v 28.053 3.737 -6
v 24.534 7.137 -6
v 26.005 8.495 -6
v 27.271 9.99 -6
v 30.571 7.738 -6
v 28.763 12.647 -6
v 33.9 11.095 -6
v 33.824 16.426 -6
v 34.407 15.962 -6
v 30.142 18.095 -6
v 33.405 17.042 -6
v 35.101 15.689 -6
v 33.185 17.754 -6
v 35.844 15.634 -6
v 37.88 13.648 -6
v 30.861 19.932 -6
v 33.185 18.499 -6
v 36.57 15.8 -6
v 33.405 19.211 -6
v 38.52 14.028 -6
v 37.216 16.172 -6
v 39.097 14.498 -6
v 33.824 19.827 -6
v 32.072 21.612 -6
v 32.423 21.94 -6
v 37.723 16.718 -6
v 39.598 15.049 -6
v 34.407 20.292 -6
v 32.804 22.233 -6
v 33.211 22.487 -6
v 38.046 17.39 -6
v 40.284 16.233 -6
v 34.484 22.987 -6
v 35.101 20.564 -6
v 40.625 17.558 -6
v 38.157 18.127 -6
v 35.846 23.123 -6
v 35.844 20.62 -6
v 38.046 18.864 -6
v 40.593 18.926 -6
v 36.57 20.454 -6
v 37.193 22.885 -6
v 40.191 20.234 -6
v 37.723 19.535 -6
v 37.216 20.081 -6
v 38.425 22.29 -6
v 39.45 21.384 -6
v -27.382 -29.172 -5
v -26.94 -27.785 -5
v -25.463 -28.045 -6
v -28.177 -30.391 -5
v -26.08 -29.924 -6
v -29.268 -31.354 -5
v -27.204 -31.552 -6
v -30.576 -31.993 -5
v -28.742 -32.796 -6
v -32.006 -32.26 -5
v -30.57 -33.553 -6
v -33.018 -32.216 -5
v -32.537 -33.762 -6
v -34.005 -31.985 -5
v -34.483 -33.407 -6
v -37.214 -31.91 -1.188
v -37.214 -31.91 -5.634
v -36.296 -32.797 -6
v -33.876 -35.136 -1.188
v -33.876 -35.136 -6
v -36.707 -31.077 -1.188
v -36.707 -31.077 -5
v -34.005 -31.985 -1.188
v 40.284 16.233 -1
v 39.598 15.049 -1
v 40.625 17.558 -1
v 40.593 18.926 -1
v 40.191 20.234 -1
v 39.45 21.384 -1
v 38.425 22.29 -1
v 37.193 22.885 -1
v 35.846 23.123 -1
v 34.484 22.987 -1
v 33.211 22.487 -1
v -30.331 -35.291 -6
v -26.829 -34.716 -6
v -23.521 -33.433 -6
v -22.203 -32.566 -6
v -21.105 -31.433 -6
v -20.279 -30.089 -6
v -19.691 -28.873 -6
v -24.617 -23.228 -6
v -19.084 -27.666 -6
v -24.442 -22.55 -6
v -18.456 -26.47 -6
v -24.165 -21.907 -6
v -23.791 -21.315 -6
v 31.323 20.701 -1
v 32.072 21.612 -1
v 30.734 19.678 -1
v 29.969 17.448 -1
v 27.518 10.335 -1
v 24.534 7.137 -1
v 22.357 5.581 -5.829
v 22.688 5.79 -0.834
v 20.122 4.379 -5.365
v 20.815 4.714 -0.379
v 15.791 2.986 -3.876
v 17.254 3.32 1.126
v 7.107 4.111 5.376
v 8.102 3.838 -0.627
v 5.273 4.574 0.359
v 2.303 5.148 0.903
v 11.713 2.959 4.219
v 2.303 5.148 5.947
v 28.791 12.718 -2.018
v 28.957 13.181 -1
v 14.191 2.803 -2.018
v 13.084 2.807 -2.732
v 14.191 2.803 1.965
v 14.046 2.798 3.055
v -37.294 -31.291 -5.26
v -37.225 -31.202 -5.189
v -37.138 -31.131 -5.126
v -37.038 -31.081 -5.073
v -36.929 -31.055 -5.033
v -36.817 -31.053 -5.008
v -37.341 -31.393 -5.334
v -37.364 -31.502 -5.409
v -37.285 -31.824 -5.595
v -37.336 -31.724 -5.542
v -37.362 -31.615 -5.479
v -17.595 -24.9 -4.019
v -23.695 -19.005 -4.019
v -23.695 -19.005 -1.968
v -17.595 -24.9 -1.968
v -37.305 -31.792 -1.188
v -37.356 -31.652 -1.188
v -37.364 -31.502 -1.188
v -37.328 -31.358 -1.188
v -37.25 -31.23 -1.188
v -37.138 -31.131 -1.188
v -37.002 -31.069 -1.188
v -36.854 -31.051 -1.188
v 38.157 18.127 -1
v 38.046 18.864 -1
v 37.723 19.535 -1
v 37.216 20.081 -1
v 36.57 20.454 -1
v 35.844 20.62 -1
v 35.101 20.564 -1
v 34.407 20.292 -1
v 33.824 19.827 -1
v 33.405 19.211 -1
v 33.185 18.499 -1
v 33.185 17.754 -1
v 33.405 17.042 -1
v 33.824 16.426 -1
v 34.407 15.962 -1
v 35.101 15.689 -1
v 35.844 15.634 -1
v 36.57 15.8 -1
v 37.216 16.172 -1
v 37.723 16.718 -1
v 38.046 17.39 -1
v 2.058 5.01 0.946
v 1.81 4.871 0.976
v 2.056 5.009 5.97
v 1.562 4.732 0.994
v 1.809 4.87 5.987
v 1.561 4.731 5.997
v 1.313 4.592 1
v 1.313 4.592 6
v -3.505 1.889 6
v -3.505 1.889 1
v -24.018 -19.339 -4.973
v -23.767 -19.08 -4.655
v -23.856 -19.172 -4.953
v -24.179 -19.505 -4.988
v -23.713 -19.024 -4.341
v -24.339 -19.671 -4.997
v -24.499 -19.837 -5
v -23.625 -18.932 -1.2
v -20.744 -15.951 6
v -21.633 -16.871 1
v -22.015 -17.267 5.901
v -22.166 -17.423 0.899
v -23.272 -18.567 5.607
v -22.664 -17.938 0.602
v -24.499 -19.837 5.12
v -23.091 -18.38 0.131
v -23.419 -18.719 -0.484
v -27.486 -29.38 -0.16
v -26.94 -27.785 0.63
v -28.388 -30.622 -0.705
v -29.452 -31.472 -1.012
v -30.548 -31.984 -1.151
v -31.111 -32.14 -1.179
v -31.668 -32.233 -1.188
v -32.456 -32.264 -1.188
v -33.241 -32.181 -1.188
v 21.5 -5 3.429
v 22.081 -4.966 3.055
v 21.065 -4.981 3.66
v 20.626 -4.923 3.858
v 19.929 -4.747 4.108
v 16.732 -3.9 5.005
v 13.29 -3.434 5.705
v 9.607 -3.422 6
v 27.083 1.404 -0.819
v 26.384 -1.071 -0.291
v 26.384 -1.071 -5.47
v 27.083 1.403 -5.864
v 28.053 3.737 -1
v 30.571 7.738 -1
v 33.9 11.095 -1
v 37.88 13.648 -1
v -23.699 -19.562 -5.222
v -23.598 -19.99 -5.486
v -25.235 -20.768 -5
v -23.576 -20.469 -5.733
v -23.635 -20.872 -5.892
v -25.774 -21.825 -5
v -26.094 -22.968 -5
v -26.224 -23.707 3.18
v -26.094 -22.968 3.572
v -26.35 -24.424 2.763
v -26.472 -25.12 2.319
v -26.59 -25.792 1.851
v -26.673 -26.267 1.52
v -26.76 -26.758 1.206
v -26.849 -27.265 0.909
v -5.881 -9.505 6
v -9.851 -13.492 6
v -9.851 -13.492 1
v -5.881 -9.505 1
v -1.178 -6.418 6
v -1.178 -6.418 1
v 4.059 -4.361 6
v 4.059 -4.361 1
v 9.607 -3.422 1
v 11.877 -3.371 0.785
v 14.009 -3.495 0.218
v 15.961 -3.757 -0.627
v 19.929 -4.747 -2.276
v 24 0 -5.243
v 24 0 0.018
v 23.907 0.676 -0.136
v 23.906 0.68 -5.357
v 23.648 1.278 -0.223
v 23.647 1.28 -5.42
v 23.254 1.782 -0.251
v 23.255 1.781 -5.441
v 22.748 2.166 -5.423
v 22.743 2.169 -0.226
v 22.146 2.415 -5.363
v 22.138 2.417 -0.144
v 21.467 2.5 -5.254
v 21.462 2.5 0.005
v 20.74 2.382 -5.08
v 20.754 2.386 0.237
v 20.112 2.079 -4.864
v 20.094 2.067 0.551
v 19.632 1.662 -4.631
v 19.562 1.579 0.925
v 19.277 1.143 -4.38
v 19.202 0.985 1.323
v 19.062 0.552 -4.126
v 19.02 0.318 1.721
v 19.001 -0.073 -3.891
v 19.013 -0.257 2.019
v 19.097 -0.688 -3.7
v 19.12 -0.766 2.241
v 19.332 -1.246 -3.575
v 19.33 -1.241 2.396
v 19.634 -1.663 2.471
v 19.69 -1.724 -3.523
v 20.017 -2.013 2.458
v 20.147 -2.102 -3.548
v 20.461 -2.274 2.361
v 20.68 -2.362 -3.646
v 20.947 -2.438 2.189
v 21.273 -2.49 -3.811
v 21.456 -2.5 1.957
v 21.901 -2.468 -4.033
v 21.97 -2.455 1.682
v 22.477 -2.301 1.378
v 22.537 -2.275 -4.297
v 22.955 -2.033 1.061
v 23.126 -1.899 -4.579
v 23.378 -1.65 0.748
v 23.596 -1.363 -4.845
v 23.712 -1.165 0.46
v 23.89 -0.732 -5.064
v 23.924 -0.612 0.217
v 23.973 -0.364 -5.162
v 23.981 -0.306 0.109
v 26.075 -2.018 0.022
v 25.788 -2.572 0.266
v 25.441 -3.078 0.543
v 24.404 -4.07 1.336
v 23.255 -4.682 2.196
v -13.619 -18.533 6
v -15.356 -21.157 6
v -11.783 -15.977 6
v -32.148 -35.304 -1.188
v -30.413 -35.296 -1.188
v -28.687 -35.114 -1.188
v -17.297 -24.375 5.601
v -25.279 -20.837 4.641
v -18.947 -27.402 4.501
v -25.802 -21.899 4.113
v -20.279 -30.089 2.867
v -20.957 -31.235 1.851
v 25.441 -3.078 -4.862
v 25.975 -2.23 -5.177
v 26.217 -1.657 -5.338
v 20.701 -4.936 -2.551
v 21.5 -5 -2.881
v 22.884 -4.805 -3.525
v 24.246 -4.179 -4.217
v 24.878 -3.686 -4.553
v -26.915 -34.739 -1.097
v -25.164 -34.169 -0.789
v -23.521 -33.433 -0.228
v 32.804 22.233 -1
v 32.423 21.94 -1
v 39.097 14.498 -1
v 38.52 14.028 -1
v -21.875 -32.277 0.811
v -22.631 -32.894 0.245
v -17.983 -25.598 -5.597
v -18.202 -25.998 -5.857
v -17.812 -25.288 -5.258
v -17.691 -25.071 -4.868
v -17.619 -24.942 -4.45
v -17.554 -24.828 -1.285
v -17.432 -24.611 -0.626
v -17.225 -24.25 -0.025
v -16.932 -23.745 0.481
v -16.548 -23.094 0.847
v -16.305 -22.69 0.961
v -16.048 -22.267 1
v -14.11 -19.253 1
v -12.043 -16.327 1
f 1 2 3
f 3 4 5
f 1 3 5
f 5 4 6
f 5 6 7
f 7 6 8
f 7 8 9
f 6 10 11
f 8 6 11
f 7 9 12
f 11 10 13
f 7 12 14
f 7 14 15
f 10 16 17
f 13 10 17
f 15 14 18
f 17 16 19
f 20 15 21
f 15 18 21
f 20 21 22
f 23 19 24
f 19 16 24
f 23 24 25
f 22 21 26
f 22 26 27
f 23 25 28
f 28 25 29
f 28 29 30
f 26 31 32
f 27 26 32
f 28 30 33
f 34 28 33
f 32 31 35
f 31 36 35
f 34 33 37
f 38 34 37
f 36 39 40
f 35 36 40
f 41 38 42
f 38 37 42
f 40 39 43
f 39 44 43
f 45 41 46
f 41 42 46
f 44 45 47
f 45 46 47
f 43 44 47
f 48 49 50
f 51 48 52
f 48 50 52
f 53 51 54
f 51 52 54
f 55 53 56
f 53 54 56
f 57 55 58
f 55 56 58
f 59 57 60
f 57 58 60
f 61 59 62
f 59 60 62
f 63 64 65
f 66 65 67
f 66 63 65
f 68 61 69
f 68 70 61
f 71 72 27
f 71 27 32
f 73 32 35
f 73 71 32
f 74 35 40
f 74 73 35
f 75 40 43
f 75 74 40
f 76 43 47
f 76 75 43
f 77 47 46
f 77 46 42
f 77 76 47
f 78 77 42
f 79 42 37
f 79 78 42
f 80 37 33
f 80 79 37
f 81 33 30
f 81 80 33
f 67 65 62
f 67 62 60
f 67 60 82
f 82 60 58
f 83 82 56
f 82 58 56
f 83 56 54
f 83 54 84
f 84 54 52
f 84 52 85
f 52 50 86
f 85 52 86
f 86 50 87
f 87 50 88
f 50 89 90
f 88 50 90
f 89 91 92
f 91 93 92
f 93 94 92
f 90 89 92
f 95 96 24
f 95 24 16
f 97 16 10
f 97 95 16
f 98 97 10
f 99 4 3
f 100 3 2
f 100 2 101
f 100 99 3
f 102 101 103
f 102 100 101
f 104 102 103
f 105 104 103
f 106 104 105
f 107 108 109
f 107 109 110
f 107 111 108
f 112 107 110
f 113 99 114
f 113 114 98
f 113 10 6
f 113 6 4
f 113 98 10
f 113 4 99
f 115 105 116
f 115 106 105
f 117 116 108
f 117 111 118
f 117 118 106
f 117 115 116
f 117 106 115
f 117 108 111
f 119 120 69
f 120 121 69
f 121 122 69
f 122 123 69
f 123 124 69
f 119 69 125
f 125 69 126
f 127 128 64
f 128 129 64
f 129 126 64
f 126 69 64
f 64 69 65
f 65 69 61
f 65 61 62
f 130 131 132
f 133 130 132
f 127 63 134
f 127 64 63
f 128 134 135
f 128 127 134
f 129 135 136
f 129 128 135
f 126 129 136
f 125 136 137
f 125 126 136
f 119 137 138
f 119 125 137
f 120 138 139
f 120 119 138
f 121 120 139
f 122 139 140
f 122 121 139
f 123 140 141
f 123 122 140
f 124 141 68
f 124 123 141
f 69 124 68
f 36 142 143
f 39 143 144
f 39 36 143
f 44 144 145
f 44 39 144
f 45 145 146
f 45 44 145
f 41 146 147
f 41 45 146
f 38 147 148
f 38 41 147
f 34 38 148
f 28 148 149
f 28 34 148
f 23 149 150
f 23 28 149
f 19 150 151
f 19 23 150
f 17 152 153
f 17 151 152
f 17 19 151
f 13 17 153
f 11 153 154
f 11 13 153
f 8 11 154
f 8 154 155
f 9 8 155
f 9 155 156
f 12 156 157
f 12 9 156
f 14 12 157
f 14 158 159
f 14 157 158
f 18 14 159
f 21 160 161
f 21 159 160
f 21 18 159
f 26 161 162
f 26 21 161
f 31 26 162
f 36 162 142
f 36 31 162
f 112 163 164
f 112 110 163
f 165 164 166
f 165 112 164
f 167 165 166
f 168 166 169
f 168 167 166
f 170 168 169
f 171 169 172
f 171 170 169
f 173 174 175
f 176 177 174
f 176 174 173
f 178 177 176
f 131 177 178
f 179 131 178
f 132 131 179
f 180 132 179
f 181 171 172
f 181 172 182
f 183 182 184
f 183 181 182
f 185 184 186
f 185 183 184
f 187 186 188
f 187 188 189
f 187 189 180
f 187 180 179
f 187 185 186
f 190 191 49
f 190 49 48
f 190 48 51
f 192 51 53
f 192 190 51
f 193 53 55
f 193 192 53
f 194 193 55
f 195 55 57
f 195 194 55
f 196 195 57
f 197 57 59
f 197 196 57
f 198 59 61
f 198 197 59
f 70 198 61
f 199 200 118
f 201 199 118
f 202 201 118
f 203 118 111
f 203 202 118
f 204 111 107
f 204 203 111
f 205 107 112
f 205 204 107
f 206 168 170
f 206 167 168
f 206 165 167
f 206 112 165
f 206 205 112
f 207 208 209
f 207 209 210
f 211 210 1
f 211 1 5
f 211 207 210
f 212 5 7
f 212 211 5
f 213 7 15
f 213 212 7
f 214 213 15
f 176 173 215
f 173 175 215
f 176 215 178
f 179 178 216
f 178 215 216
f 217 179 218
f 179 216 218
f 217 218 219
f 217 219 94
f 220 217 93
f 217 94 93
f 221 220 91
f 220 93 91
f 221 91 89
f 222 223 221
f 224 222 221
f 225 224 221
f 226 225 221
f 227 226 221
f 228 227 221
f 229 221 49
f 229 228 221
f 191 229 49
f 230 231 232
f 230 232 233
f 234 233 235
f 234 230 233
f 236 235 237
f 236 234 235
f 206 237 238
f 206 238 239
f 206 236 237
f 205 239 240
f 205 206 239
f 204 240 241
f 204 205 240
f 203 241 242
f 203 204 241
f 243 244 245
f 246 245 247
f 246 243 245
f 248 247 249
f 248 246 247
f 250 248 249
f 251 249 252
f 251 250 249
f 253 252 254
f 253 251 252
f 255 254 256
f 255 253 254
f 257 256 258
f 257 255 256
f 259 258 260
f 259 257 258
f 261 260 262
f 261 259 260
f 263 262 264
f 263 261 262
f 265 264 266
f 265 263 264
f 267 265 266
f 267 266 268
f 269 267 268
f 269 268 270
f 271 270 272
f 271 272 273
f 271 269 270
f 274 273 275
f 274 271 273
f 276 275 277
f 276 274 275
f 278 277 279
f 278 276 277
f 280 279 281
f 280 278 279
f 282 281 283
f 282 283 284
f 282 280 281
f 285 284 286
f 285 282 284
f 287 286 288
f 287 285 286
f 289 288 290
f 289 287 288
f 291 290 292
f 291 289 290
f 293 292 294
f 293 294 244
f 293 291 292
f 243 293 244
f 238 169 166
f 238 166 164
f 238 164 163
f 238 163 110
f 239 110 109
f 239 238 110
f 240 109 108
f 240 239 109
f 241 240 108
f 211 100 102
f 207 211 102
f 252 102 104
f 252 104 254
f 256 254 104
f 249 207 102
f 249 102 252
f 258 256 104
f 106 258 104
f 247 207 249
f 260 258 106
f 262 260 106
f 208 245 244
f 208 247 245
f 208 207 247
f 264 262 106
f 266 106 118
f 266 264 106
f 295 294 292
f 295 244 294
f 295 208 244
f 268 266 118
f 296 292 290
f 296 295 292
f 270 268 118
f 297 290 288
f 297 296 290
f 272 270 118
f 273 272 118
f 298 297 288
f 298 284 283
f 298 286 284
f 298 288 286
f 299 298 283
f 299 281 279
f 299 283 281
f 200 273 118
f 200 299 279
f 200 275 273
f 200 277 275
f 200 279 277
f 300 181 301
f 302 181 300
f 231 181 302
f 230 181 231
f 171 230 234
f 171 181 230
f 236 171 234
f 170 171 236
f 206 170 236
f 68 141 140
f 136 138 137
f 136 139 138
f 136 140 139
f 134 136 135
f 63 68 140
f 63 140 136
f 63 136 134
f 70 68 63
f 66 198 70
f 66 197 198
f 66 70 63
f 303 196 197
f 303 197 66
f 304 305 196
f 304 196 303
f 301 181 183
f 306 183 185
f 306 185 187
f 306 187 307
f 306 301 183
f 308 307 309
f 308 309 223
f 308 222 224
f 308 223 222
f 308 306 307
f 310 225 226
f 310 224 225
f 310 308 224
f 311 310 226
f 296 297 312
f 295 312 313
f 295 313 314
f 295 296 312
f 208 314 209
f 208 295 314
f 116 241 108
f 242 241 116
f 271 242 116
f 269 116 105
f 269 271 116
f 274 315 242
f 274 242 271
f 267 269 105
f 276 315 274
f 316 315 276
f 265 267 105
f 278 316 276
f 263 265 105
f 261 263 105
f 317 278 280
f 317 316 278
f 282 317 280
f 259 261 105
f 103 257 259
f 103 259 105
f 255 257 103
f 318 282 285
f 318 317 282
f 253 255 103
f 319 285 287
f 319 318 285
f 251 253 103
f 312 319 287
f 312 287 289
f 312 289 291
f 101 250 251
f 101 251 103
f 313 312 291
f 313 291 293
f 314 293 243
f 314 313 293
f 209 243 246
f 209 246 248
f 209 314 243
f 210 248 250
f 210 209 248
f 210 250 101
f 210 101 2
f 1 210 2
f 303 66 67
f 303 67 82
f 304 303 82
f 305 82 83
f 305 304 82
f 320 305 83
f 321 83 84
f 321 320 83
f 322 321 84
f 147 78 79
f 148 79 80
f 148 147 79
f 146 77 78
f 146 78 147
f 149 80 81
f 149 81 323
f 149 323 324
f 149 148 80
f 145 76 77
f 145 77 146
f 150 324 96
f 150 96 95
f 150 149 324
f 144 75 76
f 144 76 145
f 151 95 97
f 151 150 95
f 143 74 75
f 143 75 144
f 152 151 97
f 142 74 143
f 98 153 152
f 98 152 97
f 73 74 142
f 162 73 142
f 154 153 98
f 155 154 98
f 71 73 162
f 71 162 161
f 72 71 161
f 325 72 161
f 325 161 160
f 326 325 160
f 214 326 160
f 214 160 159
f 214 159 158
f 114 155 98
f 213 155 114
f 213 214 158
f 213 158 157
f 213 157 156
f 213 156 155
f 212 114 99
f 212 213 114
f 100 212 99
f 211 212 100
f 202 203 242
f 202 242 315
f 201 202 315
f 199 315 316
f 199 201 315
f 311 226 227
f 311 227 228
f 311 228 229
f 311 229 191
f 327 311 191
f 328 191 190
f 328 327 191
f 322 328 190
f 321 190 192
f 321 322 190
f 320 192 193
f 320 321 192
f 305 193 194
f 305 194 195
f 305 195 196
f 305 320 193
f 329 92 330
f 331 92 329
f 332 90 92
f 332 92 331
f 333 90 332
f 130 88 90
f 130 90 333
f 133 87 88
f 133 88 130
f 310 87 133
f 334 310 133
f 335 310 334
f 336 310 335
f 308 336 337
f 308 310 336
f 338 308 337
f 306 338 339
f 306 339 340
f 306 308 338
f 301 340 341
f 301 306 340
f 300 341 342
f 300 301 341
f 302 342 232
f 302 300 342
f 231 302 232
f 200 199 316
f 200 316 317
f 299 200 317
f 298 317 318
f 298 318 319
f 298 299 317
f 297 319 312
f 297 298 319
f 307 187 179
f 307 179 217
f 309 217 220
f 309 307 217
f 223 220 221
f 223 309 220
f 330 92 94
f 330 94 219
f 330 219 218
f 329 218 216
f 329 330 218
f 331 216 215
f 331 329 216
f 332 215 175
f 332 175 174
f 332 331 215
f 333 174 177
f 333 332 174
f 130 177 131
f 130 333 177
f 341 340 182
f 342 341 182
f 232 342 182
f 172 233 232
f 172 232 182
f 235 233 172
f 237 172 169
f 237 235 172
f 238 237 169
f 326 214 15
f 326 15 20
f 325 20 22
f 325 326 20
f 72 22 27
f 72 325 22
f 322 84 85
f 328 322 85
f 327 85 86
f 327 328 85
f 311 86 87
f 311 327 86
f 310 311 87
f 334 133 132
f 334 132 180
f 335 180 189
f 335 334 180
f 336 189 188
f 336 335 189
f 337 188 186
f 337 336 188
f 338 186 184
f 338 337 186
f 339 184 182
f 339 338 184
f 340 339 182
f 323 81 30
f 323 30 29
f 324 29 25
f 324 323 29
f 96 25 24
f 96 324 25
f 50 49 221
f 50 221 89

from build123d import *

# Parameters (mm, degrees)
SKETCH_1_R               = 2.5
EXTRUDE_1_DEPTH          = 6
SKETCH_2_OUTSIDE_W       = 116.224
SKETCH_2_OUTSIDE_H       = 89.061
CUT_EXTRUDE_1_DEPTH      = 12
CUT_EXTRUDE_2_DEPTH      = 10
CUT_EXTRUDE_2_DEPTH_BACK = 58.99683528
SKETCH_3_OUTSIDE_W       = 33.874
SKETCH_3_OUTSIDE_H       = 119.124
FILLET_1_R               = 0.5


with BuildPart() as part:
    # 草圖1 → 填料-伸長1 (new, symmetric)
    with BuildSketch(Plane.XY):
        with BuildLine():
            Line((33.210571119, 22.487406669), (9.212656684, 9.024071248))
            Line((9.212656684, 9.024071248), (9.212656684, 13.217540535))
            Line((9.212656684, 13.217540535), (-51.018500429, 13.217540535))
            Line((-51.018500429, 13.217540535), (-51.018500429, -41.386180002))
            Line((-51.018500429, -41.386180002), (9.212656684, -41.386180002))
            Line((9.212656684, -41.386180002), (9.212656684, -5))
            Line((9.212656684, -5), (21.5, -5))
            ThreePointArc((21.5, -5), (23.692257033, -4.493774483), (25.440603486, -3.07760364))
            Line((25.440603486, -3.07760364), (39.59758023, 15.049172396))
            ThreePointArc((39.59758023, 15.049172396), (39.450390654, 21.384077206), (33.210571119, 22.487406669))
        make_face()
        with Locations((21.5, 0)):
            Circle(SKETCH_1_R, mode=Mode.SUBTRACT)
        with Locations((35.656976744, 18.126776036)):
            Circle(SKETCH_1_R, mode=Mode.SUBTRACT)
    extrude(amount=EXTRUDE_1_DEPTH, both=True)

    # 草圖2 outside → 除料-伸長1 (cut)
    with BuildSketch(Plane.XY.offset(6)):
        with Locations((-5.181, -9.1295)):
            Rectangle(SKETCH_2_OUTSIDE_W, SKETCH_2_OUTSIDE_H)
        with BuildLine():
            Line((-3.504662874, 1.889387135), (-24.499095951, -19.837093245))
            ThreePointArc((-24.499095951, -19.837093245), (-25.530846828, -21.28330144), (-26.093887373, -22.968238639))
            Line((-26.093887373, -22.968238639), (-26.940110928, -27.785073774))
            ThreePointArc((-26.940110928, -27.785073774), (-29.508767127, -31.506192899), (-34.004940633, -31.984884889))
            Line((-34.004940633, -31.984884889), (-38.806738202, -30.371166034))
            Line((-38.806738202, -30.371166034), (-33.875603228, -35.136152419))
            ThreePointArc((-33.875603228, -35.136152419), (-28.5650672, -35.094081272), (-23.520676583, -33.433453021))
            ThreePointArc((-23.520676583, -33.433453021), (-21.623015625, -32.029319154), (-20.278640263, -30.088864592))
            ThreePointArc((-20.278640263, -30.088864592), (-15.559314436, -21.479893225), (-9.851228903, -13.492141112))
            ThreePointArc((-9.851228903, -13.492141112), (3.673898096, -4.470950273), (19.929199503, -4.746850092))
            ThreePointArc((19.929199503, -4.746850092), (23.974199209, -4.344920975), (26.383894798, -1.071247685))
            ThreePointArc((26.383894798, -1.071247685), (30.458421446, 7.595163953), (37.879524863, 13.647905658))
            ThreePointArc((37.879524863, 13.647905658), (39.697047859, 21.072590929), (32.072223107, 21.612395258))
            add(Edge.make_bspline(
                [(32.072223107, 21.612395258), (29.619553058, 19.089968877), (30.529442098, 9.384107467), (14.497116464, 0.221014353), (7.895302384, 4.290965143), (2.303499892, 5.147888773)],
                knots=[0, 0, 0, 0, 0.241565864, 0.691252681, 1, 1, 1, 1], degree=3))
            Line((2.303499892, 5.147888773), (-3.504662874, 1.889387135))
        make_face(mode=Mode.SUBTRACT)
    extrude(amount=-CUT_EXTRUDE_1_DEPTH, mode=Mode.SUBTRACT)

    # 草圖3 outside → 除料-伸長2 (cut, two sides: drawn at the far end of the back side and taken through both)
    with BuildSketch(Plane(origin=(-2.756507166, 2.663630014, 0), x_dir=(0, 0, 1), z_dir=(-0.7191178918168458, 0.6948880900324134, 0)).offset(-CUT_EXTRUDE_2_DEPTH_BACK)):
        with Locations((0, -3.742)):
            Rectangle(SKETCH_3_OUTSIDE_W, SKETCH_3_OUTSIDE_H)
        with BuildLine():
            Line((-6.187691288, -50.234611396), (-6.018499381, -32.113761289))
            ThreePointArc((-6.018499381, -32.113761289), (-5.426182761, -30.711634106), (-4.018586552, -30.132434202))
            Line((-4.018586552, -30.132434202), (-1.968123233, -30.132434202))
            ThreePointArc((-1.968123233, -30.132434202), (0.130656832, -29.263091034), (1, -27.164310969))
            Line((1, -27.164310969), (1, 4.214817456))
            ThreePointArc((1, 4.214817456), (0.578987205, 6.455061571), (-0.626602337, 8.38961561))
            ThreePointArc((-0.626602337, 8.38961561), (-4.609205755, 14.780315976), (-6, 22.180847883))
            Line((-6, 22.180847883), (-6, 42.812897435))
            Line((-6, 42.812897435), (-1, 42.812897435))
            Line((-1, 42.812897435), (-1, 22.180847883))
            ThreePointArc((-1, 22.180847883), (0.049659461, 16.595522548), (3.055407703, 11.772336713))
            ThreePointArc((3.055407703, 11.772336713), (5.237852421, 8.270268144), (6, 4.214817456))
            Line((6, 4.214817456), (6, -25.885224287))
            ThreePointArc((6, -25.885224287), (4.929184182, -31.828600934), (1.85140464, -37.024526797))
            ThreePointArc((1.85140464, -37.024526797), (-0.403254217, -40.83085539), (-1.187691288, -45.184736692))
            Line((-1.187691288, -45.184736692), (-1.187691288, -50.234611396))
            Line((-1.187691288, -50.234611396), (-6.187691288, -50.234611396))
        make_face(mode=Mode.SUBTRACT)
    extrude(amount=CUT_EXTRUDE_2_DEPTH + CUT_EXTRUDE_2_DEPTH_BACK, mode=Mode.SUBTRACT)

    # 導角1
    # the kernel refuses this chamfer: 1.5, 1 mm, written as the material it takes off along each edge
    with BuildSketch(Plane(origin=(-26.093887373, -22.968238639, -6), x_dir=(-0.282693705610689, 0.04966374508326484, 0.9579236823632671), z_dir=(-0.1730305243432829, -0.9849164622674802, 0))) as chamfer_1_piece_1:
        with BuildLine():
            Line((1.304503805, 0), (-0.777114665, -1.723908552))
            Line((-0.777114665, -1.723908552), (-0.992647493, -1.65932837))
            ThreePointArc((-0.992647493, -1.65932837), (-0.484534059, -0.833196734), (-0.215532829, 0.064580181))
            Line((-0.215532829, 0.064580181), (0.064580181, 0.215532829))
            ThreePointArc((0.064580181, 0.215532829), (0.663098125, 0.036198675), (1.369083986, 0.215532829))
            Line((1.369083986, 0.215532829), (1.304503805, 0))
        make_face()
    extrude(amount=4.890602726, mode=Mode.SUBTRACT)
    with BuildSketch(Plane(origin=(-34.004940633, -31.984884889, -6), x_dir=(0.0914334019577149, 0.27207012289855914, 0.9579236823632674), z_dir=(-0.9479034644759905, 0.31855772166816915, 0))) as chamfer_1_piece_2:
        with BuildLine():
            Line((1.304503805, 0), (-0.777114665, -1.723908552))
            Line((-0.777114665, -1.723908552), (-0.992647493, -1.65932837))
            ThreePointArc((-0.992647493, -1.65932837), (-0.484534059, -0.833196734), (-0.215532829, 0.064580181))
            Line((-0.215532829, 0.064580181), (0.064580181, 0.215532829))
            ThreePointArc((0.064580181, 0.215532829), (0.663098125, 0.036198675), (1.369083986, 0.215532829))
            Line((1.369083986, 0.215532829), (1.304503805, 0))
        make_face()
    extrude(amount=9.793128388, mode=Mode.SUBTRACT)
    with BuildSketch(Plane(origin=(-20.1843886, -24.006421785, -6), x_dir=(-0.1096964588169662, 0.9939651336556115, 0), z_dir=(0.9939651336556115, 0.1096964588169662, 0))) as chamfer_1_piece_3:
        with BuildLine():
            Line((6.374422632, 1.249615088), (4.125577368, -0.249615088))
            Line((4.125577368, -0.249615088), (4.125577368, -0.474615088))
            ThreePointArc((4.125577368, -0.474615088), (5.062788684, -0.225), (6, -0.225))
            Line((6, -0.225), (6.225, 0))
            ThreePointArc((6.225, 0), (6.225, 0.624807544), (6.599422632, 1.249615088))
            Line((6.599422632, 1.249615088), (6.374422632, 1.249615088))
        make_face()
    revolve(axis=Axis((-20.1843886, -24.006421785, -6), (0, 0, 1)), revolution_arc=73.738114823, mode=Mode.SUBTRACT)
    with BuildSketch(Plane(origin=(-32.278357873, -26.847248381, -6), x_dir=(0.9849164622674801, -0.17303052434328284, 0), z_dir=(0.17303052434328284, 0.9849164622674801, 0))) as chamfer_1_piece_4:
        with BuildLine():
            Line((5.045577083, -1.249615088), (7.294422348, 0.249615088))
            Line((7.294422348, 0.249615088), (7.294422348, 0.474615088))
            ThreePointArc((7.294422348, 0.474615088), (6.357211031, 0.225), (5.419999715, 0.225))
            Line((5.419999715, 0.225), (5.194999715, 0))
            ThreePointArc((5.194999715, 0), (5.194999715, -0.624807544), (4.820577083, -1.249615088))
            Line((4.820577083, -1.249615088), (5.045577083, -1.249615088))
        make_face()
    revolve(axis=Axis((-32.278357873, -26.847248381, -6), (0, 0, -1)), revolution_arc=98.611657286, mode=Mode.SUBTRACT)

    # 圓角1
    fillet_1_edges = [part.edges().sort_by_distance(p)[0] for p in [
        (-38.806738202, -30.371166034, -3.093845644),
    ]]
    fillet(fillet_1_edges, radius=FILLET_1_R)


solid = part.part
